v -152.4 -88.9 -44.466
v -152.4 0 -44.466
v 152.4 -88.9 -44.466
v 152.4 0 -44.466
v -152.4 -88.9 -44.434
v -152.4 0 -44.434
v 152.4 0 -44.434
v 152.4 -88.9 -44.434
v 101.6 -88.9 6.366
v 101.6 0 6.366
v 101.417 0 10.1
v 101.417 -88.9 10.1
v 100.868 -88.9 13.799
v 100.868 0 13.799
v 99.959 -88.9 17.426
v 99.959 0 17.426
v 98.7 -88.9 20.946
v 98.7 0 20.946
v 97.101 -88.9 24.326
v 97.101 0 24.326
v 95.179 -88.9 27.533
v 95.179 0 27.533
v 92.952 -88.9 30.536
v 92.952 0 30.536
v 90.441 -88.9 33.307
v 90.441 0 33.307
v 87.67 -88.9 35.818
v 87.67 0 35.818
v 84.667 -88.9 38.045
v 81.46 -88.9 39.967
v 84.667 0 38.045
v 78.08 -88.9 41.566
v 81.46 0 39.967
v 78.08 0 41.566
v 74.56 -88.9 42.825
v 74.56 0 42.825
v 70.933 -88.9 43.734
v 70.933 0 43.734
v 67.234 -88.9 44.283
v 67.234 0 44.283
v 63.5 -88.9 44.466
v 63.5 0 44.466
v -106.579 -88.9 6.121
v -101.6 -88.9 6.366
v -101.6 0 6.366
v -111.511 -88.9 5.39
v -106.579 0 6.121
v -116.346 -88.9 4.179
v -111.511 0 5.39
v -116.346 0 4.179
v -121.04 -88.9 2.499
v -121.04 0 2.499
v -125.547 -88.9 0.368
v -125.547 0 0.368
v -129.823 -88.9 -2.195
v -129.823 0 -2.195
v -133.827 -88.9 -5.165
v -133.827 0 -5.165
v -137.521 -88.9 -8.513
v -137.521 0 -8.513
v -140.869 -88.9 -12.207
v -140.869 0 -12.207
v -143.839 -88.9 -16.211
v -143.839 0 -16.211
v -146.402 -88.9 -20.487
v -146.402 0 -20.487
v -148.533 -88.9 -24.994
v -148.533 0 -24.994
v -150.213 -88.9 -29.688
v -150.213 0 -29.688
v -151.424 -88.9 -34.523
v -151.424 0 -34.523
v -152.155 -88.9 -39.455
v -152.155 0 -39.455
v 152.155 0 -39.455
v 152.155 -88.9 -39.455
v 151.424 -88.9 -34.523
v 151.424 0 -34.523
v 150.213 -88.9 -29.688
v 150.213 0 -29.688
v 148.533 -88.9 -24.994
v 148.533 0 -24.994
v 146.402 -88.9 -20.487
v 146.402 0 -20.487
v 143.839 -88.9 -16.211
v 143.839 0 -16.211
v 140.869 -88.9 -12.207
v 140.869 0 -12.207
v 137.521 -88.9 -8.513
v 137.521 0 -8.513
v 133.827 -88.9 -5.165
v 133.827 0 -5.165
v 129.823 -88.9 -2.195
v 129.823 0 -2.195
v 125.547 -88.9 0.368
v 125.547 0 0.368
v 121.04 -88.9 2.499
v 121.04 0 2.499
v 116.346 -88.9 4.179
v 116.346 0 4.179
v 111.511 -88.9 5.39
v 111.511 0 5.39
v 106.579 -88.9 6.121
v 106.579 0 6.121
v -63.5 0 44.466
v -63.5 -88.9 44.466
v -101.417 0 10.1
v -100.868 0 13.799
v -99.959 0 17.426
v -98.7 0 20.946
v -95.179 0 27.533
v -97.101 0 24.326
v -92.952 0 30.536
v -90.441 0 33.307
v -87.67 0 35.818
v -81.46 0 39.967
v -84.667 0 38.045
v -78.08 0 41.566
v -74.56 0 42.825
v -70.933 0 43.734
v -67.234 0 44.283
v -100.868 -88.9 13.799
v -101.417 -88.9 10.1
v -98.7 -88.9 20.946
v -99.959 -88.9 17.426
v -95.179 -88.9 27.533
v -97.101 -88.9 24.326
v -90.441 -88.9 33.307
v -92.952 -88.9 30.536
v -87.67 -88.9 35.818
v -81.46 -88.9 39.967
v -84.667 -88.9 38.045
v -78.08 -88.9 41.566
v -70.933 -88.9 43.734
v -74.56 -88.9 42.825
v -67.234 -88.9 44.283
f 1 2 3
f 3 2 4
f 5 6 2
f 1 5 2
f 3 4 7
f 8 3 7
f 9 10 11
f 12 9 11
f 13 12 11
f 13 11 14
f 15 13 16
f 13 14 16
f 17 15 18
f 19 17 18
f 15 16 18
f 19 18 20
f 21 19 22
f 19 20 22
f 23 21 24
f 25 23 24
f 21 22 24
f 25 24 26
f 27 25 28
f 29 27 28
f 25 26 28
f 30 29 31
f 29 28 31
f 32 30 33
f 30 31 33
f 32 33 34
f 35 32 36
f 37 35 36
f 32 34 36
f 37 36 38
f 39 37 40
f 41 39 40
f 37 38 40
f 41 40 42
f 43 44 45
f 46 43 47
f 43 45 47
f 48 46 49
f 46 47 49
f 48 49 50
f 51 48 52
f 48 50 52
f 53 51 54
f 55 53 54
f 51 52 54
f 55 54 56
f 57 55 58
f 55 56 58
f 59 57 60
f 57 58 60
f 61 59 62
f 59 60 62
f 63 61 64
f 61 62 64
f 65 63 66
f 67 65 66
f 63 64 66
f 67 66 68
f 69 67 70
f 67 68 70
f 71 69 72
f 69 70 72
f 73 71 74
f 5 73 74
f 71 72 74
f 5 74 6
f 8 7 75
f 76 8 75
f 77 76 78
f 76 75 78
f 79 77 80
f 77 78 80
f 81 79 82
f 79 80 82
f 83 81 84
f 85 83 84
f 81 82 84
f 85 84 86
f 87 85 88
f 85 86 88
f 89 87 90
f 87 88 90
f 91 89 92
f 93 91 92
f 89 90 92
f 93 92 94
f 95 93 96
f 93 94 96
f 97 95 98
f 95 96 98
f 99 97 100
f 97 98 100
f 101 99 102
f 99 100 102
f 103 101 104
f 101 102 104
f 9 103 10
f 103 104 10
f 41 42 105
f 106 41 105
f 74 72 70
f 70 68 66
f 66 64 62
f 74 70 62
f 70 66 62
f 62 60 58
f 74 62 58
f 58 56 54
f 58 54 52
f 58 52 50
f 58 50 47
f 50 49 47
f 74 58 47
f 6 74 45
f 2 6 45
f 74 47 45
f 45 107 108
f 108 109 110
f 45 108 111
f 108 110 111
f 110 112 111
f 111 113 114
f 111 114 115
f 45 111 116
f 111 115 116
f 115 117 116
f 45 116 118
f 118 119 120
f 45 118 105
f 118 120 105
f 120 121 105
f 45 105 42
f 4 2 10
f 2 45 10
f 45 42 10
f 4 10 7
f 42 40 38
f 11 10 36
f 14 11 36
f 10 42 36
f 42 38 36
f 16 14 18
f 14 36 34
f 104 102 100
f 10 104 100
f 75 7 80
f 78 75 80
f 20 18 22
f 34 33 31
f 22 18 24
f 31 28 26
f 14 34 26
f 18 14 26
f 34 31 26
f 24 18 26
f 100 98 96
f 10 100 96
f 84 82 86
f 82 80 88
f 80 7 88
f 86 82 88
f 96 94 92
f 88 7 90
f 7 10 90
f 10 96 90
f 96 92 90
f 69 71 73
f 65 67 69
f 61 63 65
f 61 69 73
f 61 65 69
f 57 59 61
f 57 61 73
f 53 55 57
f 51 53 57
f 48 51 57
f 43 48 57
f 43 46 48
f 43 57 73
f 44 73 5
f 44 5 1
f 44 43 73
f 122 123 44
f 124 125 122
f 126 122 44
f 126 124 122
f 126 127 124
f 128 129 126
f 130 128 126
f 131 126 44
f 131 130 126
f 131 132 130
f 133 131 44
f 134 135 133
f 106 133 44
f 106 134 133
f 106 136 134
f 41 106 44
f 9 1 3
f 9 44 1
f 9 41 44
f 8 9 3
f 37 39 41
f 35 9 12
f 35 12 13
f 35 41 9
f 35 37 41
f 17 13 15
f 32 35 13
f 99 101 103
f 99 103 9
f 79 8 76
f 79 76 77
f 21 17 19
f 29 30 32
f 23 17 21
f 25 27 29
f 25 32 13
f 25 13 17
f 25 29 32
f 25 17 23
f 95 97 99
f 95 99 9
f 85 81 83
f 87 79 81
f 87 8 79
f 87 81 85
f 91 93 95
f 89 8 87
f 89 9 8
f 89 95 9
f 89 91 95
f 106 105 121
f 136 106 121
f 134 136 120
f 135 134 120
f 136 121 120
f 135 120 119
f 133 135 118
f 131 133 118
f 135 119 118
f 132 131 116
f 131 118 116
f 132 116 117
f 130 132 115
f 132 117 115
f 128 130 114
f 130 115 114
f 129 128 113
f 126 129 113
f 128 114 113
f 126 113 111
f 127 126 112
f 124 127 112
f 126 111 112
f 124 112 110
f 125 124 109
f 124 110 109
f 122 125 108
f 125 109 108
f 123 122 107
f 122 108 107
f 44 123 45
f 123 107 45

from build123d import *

# Parameters (mm, degrees)
F1_DEPTH = 88.9


with BuildPart() as f1:
    # F0 (on Front) → F1 (new body)
    with BuildSketch(Plane.XZ):
        with BuildLine():
            Line((-152.4, -44.465989), (152.4, -44.465989))
            Line((152.4, -44.465989), (152.4, -44.434011))
            ThreePointArc((152.4, -44.434011), (137.521024, -8.512987), (101.6, 6.365989))
            ThreePointArc((101.6, 6.365989), (90.440768, 33.306757), (63.5, 44.465989))
            Line((63.5, 44.465989), (-63.5, 44.465989))
            ThreePointArc((-63.5, 44.465989), (-90.440768, 33.306757), (-101.6, 6.365989))
            ThreePointArc((-101.6, 6.365989), (-137.521024, -8.512987), (-152.4, -44.434011))
            Line((-152.4, -44.434011), (-152.4, -44.465989))
        make_face()
    extrude(amount=F1_DEPTH)


solid = f1.part
